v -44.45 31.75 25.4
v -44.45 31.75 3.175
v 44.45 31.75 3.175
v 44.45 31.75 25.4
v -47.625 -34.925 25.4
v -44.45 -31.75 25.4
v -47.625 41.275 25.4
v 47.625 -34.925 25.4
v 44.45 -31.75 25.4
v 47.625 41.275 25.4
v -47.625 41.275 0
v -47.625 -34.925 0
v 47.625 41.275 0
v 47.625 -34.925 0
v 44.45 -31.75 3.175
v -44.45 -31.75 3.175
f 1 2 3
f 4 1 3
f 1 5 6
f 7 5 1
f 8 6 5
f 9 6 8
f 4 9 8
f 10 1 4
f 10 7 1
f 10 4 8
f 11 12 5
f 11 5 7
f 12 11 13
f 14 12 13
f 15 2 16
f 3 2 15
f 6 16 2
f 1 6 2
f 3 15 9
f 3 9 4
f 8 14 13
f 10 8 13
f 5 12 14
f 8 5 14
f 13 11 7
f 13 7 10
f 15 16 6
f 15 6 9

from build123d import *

# Parameters (mm, degrees)
F0_W     = 95.25
F0_H     = 76.2
F0_W_2   = 88.9
F0_H_2   = 63.5
F1_DEPTH = 25.4
F2_W     = 88.9
F2_H     = 63.5
F3_DEPTH = 3.175


with BuildPart() as f1:
    # F0 (on Top) → F1 (new body)
    with BuildSketch(Plane.XY):
        with Locations((0, 3.175)):
            Rectangle(F0_W, F0_H)
        Rectangle(F0_W_2, F0_H_2, mode=Mode.SUBTRACT)
    extrude(amount=F1_DEPTH)

    # F2 (on Top) → F3 (join)
    with BuildSketch(Plane.XY):
        Rectangle(F2_W, F2_H)
    extrude(amount=F3_DEPTH)


solid = f1.part
